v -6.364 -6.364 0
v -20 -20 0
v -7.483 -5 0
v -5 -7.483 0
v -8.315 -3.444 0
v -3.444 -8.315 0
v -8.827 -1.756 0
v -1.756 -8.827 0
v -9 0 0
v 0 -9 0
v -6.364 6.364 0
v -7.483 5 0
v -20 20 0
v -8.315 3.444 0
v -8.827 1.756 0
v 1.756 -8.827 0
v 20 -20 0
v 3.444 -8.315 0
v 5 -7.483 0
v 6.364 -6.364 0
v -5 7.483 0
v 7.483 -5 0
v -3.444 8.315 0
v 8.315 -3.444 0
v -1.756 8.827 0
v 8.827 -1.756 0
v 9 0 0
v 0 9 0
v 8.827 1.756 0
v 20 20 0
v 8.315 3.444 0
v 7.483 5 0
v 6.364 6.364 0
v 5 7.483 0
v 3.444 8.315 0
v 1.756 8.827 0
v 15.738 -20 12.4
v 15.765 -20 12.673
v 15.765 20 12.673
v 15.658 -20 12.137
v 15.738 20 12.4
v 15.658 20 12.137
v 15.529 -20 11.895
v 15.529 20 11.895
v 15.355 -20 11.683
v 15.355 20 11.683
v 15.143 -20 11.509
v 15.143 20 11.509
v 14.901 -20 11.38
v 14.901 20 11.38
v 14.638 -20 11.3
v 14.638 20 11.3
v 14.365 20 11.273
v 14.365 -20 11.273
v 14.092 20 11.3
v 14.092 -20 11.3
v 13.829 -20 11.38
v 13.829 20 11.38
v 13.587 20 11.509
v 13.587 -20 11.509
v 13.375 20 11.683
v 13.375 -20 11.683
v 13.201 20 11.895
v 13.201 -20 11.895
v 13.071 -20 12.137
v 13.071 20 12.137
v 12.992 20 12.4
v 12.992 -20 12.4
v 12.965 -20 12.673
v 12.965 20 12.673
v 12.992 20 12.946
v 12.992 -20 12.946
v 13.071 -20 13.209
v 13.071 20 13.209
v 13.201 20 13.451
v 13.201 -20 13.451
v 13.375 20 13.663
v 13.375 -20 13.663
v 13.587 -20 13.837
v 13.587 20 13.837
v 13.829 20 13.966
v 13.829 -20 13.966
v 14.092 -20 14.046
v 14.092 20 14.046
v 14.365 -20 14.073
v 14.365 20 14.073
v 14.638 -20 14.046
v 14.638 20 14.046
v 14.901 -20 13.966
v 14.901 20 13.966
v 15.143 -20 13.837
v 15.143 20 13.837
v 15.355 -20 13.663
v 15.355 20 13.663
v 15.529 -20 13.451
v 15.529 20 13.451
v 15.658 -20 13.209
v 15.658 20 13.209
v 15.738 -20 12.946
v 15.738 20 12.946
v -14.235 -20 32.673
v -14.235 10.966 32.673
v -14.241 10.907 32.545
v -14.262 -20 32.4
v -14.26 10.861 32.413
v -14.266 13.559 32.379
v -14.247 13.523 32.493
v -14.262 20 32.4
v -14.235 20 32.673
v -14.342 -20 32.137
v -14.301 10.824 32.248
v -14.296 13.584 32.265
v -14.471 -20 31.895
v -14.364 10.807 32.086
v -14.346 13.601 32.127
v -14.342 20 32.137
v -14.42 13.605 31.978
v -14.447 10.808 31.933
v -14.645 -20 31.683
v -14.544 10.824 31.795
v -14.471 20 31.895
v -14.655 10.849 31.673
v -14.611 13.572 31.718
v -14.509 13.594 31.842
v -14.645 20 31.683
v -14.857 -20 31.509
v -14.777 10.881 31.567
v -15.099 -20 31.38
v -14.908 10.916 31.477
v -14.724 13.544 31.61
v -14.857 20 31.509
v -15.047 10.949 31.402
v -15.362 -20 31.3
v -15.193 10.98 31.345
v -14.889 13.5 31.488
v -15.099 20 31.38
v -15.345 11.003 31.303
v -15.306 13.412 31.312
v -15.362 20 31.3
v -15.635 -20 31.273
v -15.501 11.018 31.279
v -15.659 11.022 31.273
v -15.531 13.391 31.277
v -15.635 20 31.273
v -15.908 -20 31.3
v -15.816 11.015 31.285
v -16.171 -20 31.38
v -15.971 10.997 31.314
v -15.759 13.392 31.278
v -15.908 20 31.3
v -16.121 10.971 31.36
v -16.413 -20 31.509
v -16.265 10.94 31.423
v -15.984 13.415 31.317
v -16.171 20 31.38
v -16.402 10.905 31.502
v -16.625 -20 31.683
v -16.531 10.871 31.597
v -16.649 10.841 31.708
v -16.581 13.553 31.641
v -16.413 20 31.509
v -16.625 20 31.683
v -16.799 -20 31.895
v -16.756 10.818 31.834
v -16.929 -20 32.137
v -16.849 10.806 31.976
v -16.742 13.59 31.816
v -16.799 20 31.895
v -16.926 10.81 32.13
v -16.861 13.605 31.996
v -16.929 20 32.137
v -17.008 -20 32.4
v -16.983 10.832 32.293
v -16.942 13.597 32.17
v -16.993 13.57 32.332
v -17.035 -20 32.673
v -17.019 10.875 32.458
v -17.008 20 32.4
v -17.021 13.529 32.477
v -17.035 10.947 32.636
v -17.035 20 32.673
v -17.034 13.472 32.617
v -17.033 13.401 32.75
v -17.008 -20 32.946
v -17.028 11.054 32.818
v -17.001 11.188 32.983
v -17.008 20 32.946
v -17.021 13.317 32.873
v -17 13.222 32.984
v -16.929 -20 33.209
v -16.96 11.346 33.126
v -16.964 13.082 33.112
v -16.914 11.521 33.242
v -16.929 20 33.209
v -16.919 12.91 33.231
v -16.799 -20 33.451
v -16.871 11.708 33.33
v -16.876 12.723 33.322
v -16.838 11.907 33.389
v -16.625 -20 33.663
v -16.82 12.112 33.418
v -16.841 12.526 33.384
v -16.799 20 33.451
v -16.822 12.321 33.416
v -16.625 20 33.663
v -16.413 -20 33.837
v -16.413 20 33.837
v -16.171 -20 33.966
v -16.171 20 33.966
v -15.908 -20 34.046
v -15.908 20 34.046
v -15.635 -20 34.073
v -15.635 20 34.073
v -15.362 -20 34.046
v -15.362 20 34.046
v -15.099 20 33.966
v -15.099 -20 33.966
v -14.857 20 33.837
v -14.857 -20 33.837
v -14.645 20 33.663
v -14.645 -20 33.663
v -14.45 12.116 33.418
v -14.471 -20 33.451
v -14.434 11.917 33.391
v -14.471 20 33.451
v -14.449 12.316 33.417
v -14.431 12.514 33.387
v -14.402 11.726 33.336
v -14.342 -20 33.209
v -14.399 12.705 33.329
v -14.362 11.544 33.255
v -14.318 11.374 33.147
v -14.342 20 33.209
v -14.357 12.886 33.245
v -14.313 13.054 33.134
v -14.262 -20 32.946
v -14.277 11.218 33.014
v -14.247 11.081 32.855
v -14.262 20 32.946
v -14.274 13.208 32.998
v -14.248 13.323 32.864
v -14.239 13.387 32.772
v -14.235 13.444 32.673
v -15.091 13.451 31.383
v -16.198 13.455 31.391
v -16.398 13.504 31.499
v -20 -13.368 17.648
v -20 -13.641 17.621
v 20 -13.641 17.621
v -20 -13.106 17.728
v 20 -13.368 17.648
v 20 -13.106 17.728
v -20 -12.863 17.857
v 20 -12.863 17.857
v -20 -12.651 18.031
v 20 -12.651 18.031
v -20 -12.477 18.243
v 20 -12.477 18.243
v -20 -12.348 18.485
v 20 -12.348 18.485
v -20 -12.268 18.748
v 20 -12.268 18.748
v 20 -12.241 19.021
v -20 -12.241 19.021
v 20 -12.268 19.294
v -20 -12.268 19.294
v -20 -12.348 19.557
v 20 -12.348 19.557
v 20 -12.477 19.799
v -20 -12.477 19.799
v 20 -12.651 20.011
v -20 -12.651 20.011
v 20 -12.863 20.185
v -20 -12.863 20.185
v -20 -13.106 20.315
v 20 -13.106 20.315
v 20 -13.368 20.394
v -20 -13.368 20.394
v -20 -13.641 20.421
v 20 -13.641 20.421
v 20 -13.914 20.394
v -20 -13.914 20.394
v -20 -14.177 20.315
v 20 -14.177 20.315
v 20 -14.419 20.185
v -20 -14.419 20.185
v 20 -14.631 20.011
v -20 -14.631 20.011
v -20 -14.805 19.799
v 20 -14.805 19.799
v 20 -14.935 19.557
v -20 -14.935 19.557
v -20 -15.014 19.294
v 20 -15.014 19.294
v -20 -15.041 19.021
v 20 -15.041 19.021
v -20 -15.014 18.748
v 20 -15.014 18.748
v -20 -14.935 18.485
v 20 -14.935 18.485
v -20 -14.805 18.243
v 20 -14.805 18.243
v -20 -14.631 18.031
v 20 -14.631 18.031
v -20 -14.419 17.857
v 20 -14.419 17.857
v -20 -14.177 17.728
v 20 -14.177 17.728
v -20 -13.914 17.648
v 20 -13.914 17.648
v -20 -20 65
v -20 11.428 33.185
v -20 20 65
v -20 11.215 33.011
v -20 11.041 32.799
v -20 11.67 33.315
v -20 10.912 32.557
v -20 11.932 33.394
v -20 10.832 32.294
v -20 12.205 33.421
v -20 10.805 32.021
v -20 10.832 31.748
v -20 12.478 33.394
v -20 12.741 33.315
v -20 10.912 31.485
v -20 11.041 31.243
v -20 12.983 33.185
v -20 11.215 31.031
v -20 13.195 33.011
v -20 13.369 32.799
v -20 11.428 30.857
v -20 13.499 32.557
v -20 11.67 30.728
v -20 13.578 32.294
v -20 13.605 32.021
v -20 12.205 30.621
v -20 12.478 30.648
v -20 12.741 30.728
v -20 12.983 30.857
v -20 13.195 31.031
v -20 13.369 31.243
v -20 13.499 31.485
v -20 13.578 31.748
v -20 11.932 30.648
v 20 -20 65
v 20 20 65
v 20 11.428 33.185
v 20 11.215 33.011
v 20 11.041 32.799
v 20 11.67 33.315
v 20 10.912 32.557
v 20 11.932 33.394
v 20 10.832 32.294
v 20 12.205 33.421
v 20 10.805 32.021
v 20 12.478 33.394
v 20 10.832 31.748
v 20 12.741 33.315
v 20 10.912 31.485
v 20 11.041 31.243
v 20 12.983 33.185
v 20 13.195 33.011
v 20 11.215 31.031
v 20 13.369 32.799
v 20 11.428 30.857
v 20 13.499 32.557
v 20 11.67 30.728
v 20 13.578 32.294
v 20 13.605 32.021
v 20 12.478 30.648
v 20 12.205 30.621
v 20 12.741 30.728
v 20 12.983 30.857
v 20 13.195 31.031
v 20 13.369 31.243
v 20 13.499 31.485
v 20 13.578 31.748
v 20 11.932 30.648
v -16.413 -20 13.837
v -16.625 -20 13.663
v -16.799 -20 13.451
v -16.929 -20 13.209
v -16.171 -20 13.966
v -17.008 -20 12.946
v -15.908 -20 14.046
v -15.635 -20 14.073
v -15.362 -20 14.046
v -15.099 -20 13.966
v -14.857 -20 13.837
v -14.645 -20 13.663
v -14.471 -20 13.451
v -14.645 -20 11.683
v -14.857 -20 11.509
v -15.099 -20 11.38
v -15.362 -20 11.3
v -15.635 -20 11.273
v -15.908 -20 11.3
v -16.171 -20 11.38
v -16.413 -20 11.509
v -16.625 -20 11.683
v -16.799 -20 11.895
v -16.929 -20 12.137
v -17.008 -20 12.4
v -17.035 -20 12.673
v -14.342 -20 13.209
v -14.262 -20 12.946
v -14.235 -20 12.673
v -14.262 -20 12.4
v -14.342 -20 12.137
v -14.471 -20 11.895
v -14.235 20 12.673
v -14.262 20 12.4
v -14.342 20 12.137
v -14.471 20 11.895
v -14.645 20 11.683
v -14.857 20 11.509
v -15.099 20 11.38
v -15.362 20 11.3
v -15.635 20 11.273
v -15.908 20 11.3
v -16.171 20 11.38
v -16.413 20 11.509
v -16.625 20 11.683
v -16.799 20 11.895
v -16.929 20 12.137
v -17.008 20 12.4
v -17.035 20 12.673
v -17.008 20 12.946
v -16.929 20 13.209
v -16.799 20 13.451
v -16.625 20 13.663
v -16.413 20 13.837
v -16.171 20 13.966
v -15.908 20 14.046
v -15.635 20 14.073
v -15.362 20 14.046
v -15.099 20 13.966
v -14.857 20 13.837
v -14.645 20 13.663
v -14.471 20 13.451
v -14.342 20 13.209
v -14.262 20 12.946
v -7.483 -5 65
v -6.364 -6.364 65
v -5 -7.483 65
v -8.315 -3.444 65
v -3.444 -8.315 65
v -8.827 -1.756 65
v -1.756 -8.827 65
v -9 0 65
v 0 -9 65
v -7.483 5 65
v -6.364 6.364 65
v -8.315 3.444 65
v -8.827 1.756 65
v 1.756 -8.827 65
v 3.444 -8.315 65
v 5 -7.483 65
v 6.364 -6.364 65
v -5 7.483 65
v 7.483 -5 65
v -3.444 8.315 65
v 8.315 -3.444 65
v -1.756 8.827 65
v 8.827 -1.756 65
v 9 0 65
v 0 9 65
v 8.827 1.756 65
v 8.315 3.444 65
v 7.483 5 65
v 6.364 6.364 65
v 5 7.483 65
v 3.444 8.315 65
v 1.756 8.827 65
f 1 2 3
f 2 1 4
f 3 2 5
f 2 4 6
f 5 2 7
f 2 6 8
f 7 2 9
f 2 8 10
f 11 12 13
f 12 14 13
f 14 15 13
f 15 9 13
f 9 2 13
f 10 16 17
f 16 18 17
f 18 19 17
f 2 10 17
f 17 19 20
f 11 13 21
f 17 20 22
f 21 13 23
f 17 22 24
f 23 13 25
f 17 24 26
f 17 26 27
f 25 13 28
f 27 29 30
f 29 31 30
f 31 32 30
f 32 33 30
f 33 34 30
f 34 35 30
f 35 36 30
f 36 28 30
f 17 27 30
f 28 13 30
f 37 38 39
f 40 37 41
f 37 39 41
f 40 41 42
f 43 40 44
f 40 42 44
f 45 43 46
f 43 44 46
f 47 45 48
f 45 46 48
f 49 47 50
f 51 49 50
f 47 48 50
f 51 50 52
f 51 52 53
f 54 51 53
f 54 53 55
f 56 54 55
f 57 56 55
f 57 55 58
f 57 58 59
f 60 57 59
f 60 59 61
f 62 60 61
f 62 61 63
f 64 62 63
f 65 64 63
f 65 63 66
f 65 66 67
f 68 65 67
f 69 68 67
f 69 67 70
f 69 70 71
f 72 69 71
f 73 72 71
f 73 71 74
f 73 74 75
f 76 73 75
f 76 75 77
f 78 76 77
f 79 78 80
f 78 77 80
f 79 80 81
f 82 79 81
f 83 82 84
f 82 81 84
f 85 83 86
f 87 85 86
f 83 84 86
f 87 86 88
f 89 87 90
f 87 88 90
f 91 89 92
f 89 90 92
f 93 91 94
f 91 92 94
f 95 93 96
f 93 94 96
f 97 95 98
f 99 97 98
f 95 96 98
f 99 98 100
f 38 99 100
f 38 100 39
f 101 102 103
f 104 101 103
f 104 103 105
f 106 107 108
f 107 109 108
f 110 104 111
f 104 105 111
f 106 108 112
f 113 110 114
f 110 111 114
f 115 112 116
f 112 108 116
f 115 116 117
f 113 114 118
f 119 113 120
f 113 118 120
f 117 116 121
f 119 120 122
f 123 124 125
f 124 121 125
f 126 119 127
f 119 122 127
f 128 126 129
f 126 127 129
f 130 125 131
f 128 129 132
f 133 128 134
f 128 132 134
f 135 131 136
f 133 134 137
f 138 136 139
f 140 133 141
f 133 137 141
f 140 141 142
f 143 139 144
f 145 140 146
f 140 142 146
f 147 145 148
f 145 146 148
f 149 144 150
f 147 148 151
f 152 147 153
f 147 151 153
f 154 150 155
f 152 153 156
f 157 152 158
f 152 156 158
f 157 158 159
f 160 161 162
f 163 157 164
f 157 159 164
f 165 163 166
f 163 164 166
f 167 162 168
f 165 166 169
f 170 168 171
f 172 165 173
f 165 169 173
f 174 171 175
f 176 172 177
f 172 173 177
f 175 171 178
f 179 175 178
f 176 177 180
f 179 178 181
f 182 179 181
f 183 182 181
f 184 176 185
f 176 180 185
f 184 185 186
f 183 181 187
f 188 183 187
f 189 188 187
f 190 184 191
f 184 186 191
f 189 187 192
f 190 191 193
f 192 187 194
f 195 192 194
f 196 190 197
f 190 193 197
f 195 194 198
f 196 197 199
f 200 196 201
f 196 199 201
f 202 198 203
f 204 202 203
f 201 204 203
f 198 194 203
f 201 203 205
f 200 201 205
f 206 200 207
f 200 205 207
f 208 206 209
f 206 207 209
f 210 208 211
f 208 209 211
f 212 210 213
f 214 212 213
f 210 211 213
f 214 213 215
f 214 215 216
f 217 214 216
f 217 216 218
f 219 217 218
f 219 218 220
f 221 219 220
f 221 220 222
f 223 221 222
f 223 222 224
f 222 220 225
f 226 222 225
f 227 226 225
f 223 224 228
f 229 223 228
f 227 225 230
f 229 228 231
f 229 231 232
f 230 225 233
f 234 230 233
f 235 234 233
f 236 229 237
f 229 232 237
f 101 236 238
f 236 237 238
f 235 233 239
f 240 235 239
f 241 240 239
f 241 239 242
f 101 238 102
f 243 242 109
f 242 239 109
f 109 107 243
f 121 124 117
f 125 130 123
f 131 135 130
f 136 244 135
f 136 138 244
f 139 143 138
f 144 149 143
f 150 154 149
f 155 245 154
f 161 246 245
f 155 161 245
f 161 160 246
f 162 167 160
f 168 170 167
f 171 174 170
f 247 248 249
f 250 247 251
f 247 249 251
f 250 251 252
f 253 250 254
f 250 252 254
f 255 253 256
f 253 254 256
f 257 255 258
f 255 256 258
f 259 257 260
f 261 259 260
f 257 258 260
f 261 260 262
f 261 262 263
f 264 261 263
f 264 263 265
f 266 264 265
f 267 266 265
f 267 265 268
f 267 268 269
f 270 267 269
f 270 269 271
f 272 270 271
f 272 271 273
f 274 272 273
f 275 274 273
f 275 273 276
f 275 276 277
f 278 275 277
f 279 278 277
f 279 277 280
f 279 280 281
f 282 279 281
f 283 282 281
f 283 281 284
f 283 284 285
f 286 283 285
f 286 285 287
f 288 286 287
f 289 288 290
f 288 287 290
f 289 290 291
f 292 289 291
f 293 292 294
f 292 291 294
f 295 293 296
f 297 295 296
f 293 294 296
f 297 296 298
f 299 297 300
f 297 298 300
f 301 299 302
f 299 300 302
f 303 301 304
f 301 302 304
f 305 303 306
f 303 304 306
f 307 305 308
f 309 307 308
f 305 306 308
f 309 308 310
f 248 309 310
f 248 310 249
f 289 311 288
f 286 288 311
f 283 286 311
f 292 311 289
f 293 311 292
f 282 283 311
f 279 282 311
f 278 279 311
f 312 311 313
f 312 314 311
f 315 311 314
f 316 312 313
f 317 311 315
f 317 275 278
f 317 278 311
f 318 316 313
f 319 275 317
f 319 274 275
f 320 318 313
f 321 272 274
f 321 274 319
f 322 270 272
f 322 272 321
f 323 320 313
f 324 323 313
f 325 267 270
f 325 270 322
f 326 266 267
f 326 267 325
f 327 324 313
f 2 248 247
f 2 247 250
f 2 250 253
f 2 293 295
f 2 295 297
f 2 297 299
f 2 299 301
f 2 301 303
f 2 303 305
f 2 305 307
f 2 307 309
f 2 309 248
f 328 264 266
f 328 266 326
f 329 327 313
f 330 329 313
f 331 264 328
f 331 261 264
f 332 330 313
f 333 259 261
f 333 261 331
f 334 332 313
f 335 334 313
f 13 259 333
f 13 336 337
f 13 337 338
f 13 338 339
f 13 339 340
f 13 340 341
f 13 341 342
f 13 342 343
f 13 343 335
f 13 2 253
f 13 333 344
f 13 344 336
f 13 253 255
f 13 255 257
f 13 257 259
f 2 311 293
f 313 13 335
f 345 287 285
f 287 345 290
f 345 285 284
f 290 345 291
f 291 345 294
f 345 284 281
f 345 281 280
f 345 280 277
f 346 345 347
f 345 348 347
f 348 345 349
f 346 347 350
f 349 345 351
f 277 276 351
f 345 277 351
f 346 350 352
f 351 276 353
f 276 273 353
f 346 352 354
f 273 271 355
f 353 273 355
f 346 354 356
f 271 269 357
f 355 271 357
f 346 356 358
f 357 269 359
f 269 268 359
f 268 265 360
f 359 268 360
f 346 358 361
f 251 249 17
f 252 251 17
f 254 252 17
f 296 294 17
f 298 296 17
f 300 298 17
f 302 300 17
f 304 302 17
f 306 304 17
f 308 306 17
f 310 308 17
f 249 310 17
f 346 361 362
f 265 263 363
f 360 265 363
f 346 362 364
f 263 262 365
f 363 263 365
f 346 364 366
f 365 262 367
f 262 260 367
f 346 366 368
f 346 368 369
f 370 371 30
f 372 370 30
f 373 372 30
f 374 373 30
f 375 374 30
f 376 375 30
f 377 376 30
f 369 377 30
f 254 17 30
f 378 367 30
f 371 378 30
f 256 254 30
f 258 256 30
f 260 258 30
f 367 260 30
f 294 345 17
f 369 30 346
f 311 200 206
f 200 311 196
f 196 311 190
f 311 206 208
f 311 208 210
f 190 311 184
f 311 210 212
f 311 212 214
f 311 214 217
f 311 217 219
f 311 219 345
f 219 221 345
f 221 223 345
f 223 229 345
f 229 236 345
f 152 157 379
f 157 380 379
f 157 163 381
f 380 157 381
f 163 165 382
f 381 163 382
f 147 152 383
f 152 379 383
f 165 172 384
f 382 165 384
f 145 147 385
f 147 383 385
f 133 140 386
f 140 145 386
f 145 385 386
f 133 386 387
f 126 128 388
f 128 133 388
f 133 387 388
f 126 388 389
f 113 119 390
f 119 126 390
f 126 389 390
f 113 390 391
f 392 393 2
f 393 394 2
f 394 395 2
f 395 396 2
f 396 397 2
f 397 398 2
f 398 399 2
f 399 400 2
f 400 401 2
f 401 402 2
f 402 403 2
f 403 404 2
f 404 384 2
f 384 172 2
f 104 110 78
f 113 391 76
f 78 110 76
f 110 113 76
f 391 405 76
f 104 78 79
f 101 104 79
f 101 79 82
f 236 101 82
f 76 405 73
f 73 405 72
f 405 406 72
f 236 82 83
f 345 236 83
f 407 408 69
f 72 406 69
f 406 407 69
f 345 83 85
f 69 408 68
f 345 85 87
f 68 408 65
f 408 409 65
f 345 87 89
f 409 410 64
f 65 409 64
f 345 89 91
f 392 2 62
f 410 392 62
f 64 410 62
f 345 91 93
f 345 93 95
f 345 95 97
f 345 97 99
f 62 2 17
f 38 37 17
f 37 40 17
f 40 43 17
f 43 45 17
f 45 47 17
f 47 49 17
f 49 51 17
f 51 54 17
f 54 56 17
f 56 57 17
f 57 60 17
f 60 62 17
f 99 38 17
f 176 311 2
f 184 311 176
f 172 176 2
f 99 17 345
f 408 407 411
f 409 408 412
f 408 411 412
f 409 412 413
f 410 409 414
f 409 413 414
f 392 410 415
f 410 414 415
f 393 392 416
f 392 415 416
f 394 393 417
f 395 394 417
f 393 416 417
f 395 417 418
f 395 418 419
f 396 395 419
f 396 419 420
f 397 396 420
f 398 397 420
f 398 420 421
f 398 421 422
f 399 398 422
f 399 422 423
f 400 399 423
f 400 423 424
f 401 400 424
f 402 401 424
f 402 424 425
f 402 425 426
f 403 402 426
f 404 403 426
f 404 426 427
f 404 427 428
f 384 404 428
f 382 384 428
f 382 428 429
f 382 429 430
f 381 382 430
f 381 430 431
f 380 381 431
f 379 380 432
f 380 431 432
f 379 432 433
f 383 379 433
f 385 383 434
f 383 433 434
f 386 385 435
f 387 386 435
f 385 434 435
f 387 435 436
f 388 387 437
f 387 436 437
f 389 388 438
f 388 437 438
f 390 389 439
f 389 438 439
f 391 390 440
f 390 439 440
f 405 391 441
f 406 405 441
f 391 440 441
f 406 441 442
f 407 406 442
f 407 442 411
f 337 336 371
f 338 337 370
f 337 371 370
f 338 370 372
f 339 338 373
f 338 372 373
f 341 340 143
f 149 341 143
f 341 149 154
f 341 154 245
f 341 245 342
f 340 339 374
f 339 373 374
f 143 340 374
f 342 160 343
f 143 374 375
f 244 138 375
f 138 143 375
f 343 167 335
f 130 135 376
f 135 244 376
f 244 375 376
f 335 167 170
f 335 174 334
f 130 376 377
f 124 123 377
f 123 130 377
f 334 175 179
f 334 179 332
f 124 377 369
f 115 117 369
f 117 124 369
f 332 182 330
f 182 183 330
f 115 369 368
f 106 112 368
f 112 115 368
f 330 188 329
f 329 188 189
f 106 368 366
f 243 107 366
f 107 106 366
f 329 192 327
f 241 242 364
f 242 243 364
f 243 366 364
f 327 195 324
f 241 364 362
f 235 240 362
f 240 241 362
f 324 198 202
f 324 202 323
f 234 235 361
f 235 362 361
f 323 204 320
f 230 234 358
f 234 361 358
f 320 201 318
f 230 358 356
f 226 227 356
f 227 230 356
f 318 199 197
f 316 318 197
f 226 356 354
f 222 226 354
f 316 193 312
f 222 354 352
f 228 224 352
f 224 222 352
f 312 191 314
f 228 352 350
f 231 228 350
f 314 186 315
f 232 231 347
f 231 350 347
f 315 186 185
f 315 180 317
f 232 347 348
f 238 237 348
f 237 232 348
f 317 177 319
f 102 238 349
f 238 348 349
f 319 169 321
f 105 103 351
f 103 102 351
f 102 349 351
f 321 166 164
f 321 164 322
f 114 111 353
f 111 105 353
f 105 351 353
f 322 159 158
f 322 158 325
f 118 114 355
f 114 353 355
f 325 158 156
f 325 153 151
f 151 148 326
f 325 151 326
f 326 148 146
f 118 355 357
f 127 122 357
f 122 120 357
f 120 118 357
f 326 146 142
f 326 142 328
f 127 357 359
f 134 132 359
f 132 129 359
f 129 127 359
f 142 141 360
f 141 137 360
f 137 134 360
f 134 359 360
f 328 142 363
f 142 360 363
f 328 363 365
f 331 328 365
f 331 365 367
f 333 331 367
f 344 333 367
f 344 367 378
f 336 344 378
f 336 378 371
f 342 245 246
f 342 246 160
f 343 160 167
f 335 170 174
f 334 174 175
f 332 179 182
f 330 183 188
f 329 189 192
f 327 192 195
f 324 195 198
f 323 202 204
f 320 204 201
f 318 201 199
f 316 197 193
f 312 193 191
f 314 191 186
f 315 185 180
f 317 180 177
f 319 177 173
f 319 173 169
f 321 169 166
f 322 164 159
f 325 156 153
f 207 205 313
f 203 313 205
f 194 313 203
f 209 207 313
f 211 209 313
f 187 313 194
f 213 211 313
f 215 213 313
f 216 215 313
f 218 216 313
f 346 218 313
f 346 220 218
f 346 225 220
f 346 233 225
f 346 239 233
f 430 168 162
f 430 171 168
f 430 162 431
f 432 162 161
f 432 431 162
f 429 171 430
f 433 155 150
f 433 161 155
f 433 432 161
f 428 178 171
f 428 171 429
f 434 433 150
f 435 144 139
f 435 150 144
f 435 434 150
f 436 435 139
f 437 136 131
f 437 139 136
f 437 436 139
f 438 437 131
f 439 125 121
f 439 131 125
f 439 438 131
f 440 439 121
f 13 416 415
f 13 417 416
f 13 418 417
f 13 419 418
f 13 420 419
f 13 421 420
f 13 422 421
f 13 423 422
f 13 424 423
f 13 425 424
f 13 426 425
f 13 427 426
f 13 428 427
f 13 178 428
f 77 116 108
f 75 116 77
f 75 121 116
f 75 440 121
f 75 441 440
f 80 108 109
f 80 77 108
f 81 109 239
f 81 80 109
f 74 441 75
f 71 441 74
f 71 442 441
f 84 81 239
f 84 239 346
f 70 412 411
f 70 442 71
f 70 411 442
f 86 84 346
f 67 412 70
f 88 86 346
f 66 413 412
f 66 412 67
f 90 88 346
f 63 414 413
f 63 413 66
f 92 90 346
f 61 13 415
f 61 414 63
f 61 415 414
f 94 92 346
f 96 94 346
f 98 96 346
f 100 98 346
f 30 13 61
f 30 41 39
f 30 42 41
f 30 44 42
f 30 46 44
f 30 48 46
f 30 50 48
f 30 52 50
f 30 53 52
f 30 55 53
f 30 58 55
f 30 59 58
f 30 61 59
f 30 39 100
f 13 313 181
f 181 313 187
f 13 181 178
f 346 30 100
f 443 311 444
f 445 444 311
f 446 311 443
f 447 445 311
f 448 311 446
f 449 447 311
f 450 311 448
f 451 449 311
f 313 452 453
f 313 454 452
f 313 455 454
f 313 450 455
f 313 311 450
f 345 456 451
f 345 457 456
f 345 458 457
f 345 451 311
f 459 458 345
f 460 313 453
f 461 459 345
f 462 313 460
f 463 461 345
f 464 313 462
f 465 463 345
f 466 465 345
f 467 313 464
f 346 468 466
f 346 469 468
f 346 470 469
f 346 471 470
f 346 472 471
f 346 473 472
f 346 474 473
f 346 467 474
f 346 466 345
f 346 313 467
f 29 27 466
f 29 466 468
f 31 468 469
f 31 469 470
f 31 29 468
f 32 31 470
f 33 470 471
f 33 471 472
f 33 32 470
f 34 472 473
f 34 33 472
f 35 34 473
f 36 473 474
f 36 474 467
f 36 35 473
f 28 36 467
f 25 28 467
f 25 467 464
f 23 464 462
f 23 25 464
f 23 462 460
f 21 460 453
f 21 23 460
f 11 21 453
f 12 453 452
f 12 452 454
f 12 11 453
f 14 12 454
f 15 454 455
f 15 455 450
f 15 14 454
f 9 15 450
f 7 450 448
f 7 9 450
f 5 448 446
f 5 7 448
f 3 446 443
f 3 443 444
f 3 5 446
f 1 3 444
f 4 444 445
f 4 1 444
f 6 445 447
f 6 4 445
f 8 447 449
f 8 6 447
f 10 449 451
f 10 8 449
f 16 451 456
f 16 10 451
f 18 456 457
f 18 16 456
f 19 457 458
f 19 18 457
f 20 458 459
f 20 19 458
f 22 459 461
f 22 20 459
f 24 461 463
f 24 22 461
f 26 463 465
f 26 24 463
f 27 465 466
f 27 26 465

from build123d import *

# Parameters (mm, degrees)
SKETCH1_W           = 40
SKETCH1_H           = 40
SKETCH1_R           = 9
BOSS_EXTRUDE1_DEPTH = 65
SKETCH2_R           = 1.4
CUT_EXTRUDE1_DEPTH  = 41
SKETCH3_R           = 1.4
CUT_EXTRUDE2_DEPTH  = 65


with BuildPart() as part:
    # Sketch1 → Boss-Extrude1 (new body)
    with BuildSketch(Plane.XY):
        Rectangle(SKETCH1_W, SKETCH1_H)
        Circle(SKETCH1_R, mode=Mode.SUBTRACT)
    extrude(amount=BOSS_EXTRUDE1_DEPTH)

    # Sketch2 → Cut-Extrude1 (cut, through all)
    with BuildSketch(Plane(origin=(0, 20, 0), x_dir=(1, 0, 0), z_dir=(0, 1, 0))):
        with Locations((14.364756044, -12.672944901)):
            Circle(SKETCH2_R)
        with Locations((-15.635243956, -32.672944901)):
            Circle(SKETCH2_R)
        with Locations((-15.635243956, -12.672944901)):
            Circle(SKETCH2_R)
    extrude(amount=-CUT_EXTRUDE1_DEPTH, mode=Mode.SUBTRACT)

    # Sketch3 → Cut-Extrude2 (cut)
    with BuildSketch(Plane(origin=(20, 0, 0), x_dir=(0, 0, -1), z_dir=(1, 0, 0))):
        with Locations((-32.021199164, 12.205306236)):
            Circle(SKETCH3_R)
        with Locations((-19.021201071, -13.641280886)):
            Circle(SKETCH3_R)
    extrude(amount=-CUT_EXTRUDE2_DEPTH, mode=Mode.SUBTRACT)


solid = part.part
